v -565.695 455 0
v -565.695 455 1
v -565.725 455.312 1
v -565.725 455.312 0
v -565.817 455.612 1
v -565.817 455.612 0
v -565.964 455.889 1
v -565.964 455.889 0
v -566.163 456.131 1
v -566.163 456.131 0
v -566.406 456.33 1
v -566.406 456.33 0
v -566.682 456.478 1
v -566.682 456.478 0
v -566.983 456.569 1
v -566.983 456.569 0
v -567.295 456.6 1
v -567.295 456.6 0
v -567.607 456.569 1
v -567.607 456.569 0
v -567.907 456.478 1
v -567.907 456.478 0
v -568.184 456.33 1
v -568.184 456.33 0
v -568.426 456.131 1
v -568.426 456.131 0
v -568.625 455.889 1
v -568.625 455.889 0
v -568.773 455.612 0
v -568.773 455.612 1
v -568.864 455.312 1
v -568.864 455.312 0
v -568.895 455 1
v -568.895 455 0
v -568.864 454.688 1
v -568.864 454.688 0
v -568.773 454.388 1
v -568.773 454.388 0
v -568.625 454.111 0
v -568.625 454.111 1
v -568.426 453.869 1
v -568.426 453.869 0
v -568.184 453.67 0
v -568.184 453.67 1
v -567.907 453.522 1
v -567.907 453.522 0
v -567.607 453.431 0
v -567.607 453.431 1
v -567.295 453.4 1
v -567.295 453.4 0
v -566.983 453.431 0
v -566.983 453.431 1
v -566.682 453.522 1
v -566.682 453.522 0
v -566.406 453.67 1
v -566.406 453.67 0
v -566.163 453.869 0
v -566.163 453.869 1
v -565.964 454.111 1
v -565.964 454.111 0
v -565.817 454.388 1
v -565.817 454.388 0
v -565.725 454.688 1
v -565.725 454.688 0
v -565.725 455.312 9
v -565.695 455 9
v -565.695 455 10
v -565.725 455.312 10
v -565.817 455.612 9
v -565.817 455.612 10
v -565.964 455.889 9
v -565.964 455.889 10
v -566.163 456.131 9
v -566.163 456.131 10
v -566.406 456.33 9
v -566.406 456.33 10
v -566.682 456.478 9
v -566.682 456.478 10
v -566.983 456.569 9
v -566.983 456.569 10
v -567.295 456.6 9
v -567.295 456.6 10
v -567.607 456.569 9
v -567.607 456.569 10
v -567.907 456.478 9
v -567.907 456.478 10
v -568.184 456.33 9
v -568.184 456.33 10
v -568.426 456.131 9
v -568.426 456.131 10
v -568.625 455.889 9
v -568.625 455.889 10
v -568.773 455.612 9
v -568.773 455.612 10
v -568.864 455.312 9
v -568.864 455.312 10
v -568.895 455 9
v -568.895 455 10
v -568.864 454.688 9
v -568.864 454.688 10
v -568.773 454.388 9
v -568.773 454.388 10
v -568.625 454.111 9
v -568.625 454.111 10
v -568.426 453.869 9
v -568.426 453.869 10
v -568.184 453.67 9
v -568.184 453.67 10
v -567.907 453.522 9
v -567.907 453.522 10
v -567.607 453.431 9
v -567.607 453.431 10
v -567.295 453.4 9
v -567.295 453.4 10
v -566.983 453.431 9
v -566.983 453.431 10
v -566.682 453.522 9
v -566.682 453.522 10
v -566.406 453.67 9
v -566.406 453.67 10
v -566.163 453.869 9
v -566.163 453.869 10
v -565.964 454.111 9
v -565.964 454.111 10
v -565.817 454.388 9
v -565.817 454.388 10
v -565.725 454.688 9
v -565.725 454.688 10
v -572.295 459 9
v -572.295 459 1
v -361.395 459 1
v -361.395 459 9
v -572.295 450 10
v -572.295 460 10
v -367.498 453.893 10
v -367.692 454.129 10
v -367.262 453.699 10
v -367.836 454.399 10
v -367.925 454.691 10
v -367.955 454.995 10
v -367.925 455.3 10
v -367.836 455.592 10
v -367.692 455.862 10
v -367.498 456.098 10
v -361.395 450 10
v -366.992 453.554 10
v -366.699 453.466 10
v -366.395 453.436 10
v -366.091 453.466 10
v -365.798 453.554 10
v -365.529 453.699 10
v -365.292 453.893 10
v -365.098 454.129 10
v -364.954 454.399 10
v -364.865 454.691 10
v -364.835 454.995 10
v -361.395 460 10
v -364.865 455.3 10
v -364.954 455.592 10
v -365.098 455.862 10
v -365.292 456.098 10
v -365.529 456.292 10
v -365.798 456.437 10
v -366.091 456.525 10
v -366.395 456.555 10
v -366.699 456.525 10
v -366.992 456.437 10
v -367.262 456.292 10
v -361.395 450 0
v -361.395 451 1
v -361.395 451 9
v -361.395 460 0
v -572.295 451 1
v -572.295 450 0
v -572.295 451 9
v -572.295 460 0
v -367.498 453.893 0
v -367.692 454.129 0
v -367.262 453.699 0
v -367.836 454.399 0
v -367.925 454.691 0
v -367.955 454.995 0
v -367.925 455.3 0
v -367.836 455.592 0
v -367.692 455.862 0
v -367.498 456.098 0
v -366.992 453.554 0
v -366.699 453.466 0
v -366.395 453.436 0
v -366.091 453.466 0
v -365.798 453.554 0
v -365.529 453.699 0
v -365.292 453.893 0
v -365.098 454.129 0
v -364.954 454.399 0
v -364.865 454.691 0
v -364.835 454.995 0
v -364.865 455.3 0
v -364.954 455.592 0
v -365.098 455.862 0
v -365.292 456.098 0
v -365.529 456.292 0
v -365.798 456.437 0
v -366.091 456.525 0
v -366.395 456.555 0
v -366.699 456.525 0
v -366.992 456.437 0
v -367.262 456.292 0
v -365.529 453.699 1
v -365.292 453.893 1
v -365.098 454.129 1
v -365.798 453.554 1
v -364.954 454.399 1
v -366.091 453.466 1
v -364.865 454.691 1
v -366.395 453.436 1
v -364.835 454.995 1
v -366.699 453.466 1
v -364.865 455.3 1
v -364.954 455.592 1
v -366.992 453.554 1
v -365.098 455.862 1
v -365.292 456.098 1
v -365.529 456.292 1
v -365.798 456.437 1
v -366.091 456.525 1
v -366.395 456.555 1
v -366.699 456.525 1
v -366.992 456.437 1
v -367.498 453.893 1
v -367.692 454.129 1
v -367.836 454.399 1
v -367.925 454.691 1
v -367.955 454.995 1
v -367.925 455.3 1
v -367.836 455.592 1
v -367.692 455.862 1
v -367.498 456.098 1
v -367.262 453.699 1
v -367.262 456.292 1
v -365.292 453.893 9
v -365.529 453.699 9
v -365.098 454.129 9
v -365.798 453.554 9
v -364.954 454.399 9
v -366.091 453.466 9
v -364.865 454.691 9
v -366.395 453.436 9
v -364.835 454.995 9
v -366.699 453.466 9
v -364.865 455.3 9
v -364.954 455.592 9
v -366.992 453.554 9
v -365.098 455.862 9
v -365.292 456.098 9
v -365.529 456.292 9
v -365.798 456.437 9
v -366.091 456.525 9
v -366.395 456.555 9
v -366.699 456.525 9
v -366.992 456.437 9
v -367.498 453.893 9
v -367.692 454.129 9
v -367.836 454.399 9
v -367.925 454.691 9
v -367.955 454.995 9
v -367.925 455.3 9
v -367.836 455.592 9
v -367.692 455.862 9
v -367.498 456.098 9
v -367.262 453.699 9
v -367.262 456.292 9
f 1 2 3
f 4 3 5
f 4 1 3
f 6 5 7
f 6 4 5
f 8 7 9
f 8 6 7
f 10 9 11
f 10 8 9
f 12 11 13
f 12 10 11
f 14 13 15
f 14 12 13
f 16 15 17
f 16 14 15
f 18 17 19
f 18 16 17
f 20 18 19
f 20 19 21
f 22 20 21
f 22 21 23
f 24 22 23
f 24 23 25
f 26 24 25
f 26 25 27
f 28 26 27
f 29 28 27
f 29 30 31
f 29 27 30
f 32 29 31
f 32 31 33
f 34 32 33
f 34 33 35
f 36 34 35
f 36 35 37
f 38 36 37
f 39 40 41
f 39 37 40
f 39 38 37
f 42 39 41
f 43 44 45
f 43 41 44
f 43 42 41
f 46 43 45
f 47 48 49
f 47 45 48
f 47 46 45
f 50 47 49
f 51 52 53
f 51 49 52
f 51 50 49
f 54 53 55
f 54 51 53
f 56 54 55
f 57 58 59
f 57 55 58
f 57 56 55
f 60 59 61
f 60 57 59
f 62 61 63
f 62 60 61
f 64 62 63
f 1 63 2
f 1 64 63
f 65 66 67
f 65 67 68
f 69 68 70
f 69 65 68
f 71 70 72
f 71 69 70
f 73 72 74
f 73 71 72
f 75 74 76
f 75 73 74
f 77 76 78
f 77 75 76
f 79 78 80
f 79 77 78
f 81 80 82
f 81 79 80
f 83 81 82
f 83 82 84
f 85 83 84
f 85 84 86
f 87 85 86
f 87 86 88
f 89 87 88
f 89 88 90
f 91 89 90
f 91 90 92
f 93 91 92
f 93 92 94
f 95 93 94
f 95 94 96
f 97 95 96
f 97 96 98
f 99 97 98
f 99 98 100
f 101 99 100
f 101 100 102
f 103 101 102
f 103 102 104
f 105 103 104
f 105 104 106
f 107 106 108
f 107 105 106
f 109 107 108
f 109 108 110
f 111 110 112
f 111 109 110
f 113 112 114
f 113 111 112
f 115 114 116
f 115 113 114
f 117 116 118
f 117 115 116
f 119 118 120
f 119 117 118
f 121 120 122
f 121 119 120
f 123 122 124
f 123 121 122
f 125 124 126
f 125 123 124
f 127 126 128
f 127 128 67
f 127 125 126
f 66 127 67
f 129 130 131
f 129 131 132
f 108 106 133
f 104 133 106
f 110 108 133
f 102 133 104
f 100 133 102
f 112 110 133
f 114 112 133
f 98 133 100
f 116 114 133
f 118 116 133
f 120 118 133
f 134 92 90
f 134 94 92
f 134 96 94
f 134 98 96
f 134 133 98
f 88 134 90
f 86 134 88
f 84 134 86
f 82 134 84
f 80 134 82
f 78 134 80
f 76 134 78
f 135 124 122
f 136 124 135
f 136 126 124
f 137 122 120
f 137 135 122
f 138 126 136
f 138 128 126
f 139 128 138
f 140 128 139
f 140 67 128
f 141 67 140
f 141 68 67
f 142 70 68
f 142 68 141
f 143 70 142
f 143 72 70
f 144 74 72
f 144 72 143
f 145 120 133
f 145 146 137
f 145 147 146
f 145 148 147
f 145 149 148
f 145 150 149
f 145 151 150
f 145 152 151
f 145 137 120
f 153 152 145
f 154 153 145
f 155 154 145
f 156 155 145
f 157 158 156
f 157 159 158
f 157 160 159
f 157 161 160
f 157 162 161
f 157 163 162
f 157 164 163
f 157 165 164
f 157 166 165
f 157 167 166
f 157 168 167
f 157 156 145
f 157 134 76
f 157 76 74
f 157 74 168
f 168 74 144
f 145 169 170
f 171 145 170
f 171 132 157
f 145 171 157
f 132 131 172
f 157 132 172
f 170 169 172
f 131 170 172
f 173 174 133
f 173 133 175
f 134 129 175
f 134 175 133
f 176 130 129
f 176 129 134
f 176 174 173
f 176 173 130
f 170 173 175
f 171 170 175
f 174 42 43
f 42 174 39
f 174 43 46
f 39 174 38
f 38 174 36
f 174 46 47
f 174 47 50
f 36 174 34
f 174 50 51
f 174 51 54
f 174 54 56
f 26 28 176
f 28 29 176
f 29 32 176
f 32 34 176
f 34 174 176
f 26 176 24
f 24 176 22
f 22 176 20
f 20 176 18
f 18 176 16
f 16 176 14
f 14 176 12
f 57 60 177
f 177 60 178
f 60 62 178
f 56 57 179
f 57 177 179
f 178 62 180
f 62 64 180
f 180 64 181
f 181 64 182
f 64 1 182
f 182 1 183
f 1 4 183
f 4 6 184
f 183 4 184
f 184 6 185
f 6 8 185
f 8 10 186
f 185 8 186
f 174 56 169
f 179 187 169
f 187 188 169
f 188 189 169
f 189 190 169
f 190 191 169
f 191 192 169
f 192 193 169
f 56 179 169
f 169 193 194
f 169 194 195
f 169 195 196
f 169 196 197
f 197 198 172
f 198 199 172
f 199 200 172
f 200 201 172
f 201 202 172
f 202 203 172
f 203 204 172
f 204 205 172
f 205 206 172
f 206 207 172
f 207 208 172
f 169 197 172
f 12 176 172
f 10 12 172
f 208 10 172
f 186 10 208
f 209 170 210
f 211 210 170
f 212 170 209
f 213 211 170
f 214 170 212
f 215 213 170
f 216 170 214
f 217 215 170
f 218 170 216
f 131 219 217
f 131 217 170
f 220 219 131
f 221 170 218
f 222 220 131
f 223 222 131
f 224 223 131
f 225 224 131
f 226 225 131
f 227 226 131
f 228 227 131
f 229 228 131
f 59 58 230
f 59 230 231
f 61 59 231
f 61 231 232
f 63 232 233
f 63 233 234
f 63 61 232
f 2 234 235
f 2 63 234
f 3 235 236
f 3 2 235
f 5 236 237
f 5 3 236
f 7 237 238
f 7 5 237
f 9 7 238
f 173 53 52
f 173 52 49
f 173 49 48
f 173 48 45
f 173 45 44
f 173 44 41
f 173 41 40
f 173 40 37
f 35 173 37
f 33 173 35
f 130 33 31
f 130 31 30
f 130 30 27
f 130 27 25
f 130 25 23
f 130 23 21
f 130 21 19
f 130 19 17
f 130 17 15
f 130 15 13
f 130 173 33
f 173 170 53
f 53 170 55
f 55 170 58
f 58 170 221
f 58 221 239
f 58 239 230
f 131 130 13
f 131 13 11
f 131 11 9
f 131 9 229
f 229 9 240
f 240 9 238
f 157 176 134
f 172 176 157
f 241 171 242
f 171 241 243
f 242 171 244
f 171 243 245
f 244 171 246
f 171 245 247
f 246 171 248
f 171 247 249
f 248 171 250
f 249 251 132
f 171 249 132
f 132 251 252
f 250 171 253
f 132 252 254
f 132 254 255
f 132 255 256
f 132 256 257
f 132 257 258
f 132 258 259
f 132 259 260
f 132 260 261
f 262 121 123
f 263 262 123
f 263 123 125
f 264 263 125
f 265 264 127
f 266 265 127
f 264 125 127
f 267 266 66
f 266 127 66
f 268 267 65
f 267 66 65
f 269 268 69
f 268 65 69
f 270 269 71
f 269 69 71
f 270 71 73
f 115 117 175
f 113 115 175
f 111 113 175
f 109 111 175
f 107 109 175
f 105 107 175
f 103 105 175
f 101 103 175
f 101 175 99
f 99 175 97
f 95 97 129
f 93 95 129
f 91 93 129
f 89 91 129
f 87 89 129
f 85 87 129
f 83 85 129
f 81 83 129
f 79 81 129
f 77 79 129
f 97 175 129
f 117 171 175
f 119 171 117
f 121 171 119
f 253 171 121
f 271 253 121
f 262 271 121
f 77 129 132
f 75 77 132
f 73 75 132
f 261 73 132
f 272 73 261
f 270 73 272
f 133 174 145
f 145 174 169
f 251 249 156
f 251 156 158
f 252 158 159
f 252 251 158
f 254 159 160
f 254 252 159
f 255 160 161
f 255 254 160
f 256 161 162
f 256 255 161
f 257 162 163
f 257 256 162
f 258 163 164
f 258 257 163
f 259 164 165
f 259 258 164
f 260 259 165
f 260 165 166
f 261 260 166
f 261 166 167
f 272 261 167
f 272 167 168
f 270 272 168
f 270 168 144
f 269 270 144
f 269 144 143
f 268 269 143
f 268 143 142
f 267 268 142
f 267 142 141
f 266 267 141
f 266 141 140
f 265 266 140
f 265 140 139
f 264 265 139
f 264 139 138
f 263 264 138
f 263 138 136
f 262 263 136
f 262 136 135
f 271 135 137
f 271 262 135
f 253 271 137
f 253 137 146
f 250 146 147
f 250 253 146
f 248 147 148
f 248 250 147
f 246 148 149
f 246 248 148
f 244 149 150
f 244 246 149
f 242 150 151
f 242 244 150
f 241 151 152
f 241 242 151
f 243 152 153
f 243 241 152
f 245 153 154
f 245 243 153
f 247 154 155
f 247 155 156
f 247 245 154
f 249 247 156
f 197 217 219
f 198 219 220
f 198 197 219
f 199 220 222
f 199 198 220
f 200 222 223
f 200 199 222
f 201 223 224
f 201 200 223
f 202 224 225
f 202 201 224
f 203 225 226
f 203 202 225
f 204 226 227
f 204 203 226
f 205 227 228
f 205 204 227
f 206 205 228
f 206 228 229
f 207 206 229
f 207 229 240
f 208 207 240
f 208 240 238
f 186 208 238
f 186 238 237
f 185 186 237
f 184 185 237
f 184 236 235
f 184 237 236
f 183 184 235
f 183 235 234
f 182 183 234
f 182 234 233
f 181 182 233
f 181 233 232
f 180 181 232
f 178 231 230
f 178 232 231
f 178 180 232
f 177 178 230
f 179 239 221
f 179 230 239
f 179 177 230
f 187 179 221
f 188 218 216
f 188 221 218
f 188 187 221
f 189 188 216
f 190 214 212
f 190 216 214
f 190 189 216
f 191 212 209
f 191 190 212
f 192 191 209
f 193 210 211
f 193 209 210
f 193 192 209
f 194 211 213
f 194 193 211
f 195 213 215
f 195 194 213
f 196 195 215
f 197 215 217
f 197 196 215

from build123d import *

# Parameters (mm, degrees)
SKETCH_1_W          = 210.89955229
SKETCH_1_H          = 10
SKETCH_1_R          = 1.6
SKETCH_1_R_2        = 1.559795767
EXTRUDE_1_DEPTH     = 10
SKETCH_2_W          = 8
SKETCH_2_H          = 8
CUT_EXTRUDE_1_DEPTH = 507.140910376


with BuildPart() as part:
    # ｽｹｯﾁ1 → ﾎﾞｽ - 押し出し1 (new body)
    with BuildSketch(Plane.XY):
        with Locations((-466.84495805, 455)):
            Rectangle(SKETCH_1_W, SKETCH_1_H)
        with Locations((-567.294734195, 455)):
            Circle(SKETCH_1_R, mode=Mode.SUBTRACT)
        with Locations((-366.395181905, 454.995481815)):
            Circle(SKETCH_1_R_2, mode=Mode.SUBTRACT)
    extrude(amount=EXTRUDE_1_DEPTH)

    # ｽｹｯﾁ2 → ｶｯﾄ - 押し出し1 (cut, through all)
    with BuildSketch(Plane.ZY.offset(572.294734195)):
        with Locations((5, 455)):
            Rectangle(SKETCH_2_W, SKETCH_2_H)
    extrude(amount=-CUT_EXTRUDE_1_DEPTH, mode=Mode.SUBTRACT)


solid = part.part
